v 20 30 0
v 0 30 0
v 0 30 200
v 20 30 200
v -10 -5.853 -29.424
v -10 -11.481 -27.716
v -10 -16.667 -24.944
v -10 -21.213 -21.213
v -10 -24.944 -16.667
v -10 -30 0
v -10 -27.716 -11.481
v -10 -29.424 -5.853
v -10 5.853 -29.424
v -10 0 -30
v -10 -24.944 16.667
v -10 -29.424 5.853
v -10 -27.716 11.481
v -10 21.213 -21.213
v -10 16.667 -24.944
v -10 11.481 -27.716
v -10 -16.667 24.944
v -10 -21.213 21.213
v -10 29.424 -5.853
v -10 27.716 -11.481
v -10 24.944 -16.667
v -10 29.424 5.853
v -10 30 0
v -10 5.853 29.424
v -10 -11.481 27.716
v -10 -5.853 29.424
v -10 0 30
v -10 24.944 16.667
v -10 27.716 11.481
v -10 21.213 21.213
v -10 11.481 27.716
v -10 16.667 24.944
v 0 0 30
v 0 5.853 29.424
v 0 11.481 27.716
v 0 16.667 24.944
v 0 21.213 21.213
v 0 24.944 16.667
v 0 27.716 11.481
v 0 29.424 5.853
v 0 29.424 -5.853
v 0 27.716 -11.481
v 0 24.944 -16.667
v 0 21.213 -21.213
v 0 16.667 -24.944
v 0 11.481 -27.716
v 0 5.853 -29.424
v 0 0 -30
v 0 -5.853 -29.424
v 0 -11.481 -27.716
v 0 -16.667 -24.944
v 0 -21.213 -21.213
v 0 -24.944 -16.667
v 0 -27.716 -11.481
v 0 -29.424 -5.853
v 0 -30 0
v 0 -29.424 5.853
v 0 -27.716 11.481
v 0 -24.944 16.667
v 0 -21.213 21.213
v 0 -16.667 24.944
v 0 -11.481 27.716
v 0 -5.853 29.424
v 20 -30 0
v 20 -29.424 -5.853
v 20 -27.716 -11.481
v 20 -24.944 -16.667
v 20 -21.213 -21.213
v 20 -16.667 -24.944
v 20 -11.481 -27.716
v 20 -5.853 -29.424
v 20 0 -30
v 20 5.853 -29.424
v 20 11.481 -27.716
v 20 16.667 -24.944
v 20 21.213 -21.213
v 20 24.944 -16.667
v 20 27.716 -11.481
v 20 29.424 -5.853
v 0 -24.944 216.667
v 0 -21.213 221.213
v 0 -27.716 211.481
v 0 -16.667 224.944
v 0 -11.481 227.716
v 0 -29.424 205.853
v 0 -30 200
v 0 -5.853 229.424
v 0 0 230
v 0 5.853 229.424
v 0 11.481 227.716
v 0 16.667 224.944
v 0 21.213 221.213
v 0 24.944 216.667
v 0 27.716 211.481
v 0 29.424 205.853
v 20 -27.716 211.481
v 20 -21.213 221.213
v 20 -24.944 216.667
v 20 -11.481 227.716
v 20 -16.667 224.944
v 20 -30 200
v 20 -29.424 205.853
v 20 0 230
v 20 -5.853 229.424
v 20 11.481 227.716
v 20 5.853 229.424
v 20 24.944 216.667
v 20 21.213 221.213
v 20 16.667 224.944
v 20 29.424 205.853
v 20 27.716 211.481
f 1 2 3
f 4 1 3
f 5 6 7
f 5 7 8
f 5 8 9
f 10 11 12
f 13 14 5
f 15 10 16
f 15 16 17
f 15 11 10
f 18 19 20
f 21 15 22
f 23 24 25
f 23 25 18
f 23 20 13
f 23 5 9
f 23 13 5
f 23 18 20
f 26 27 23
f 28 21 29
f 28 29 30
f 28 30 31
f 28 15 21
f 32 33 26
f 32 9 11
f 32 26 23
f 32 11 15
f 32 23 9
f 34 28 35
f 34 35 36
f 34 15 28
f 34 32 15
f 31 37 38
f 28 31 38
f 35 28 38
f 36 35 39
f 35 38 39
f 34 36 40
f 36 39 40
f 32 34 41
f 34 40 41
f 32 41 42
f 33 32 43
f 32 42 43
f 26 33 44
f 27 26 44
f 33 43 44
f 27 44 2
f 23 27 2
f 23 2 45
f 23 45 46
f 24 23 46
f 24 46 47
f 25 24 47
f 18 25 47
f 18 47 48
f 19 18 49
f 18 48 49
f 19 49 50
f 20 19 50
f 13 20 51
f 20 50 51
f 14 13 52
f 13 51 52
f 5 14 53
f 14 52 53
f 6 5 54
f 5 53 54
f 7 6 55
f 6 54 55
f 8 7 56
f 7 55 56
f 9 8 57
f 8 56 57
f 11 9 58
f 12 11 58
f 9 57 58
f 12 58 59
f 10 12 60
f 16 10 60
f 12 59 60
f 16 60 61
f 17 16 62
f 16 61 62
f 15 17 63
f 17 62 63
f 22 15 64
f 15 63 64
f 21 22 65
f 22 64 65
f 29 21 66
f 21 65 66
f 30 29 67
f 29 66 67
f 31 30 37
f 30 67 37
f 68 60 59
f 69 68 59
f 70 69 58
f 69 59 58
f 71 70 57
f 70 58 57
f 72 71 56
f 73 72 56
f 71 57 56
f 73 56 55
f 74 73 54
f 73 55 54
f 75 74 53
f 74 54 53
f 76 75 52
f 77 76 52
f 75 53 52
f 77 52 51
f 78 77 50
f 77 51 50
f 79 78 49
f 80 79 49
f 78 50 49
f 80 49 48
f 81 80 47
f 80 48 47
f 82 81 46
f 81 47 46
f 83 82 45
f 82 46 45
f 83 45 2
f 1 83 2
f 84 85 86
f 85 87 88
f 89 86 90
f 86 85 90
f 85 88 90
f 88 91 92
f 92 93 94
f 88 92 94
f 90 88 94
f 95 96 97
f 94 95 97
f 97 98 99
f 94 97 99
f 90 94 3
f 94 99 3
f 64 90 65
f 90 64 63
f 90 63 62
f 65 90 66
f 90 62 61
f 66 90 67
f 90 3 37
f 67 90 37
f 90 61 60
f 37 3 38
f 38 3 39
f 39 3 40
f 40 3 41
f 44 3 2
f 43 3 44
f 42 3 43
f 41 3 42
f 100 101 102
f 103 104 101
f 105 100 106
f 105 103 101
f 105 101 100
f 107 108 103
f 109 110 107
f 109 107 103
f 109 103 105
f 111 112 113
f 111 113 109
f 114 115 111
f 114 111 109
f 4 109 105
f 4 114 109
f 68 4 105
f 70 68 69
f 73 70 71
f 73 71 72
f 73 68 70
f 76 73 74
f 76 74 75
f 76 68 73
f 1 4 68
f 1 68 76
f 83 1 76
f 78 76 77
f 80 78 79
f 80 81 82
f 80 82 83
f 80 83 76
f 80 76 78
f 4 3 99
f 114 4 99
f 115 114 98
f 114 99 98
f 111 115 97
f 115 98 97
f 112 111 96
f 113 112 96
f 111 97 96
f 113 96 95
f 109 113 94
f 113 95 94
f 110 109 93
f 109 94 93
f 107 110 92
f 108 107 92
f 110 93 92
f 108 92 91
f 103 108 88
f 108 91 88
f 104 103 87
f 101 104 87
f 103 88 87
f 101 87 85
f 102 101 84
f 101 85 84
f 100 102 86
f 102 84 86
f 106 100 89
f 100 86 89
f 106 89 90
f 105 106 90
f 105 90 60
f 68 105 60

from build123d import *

# Parameters (mm, degrees)
EXTRUDE_1_DEPTH = 20
SKETCH_2_R      = 30
EXTRUDE_2_DEPTH = 10


with BuildPart() as part:
    # 草图1 → 凸台-拉伸1 (new body)
    with BuildSketch(Plane(origin=(0, 0, 0), x_dir=(0, 0, -1), z_dir=(1, 0, 0))):
        with BuildLine():
            Line((0, 30), (-200, 30))
            ThreePointArc((-200, 30), (-230, 0), (-200, -30))
            Line((-200, -30), (0, -30))
            ThreePointArc((0, -30), (30, 0), (0, 30))
        make_face()
    extrude(amount=EXTRUDE_1_DEPTH)

    # 草图2 → 凸台-拉伸2 (add)
    with BuildSketch(Plane.ZY):
        Circle(SKETCH_2_R)
    extrude(amount=EXTRUDE_2_DEPTH)


solid = part.part
